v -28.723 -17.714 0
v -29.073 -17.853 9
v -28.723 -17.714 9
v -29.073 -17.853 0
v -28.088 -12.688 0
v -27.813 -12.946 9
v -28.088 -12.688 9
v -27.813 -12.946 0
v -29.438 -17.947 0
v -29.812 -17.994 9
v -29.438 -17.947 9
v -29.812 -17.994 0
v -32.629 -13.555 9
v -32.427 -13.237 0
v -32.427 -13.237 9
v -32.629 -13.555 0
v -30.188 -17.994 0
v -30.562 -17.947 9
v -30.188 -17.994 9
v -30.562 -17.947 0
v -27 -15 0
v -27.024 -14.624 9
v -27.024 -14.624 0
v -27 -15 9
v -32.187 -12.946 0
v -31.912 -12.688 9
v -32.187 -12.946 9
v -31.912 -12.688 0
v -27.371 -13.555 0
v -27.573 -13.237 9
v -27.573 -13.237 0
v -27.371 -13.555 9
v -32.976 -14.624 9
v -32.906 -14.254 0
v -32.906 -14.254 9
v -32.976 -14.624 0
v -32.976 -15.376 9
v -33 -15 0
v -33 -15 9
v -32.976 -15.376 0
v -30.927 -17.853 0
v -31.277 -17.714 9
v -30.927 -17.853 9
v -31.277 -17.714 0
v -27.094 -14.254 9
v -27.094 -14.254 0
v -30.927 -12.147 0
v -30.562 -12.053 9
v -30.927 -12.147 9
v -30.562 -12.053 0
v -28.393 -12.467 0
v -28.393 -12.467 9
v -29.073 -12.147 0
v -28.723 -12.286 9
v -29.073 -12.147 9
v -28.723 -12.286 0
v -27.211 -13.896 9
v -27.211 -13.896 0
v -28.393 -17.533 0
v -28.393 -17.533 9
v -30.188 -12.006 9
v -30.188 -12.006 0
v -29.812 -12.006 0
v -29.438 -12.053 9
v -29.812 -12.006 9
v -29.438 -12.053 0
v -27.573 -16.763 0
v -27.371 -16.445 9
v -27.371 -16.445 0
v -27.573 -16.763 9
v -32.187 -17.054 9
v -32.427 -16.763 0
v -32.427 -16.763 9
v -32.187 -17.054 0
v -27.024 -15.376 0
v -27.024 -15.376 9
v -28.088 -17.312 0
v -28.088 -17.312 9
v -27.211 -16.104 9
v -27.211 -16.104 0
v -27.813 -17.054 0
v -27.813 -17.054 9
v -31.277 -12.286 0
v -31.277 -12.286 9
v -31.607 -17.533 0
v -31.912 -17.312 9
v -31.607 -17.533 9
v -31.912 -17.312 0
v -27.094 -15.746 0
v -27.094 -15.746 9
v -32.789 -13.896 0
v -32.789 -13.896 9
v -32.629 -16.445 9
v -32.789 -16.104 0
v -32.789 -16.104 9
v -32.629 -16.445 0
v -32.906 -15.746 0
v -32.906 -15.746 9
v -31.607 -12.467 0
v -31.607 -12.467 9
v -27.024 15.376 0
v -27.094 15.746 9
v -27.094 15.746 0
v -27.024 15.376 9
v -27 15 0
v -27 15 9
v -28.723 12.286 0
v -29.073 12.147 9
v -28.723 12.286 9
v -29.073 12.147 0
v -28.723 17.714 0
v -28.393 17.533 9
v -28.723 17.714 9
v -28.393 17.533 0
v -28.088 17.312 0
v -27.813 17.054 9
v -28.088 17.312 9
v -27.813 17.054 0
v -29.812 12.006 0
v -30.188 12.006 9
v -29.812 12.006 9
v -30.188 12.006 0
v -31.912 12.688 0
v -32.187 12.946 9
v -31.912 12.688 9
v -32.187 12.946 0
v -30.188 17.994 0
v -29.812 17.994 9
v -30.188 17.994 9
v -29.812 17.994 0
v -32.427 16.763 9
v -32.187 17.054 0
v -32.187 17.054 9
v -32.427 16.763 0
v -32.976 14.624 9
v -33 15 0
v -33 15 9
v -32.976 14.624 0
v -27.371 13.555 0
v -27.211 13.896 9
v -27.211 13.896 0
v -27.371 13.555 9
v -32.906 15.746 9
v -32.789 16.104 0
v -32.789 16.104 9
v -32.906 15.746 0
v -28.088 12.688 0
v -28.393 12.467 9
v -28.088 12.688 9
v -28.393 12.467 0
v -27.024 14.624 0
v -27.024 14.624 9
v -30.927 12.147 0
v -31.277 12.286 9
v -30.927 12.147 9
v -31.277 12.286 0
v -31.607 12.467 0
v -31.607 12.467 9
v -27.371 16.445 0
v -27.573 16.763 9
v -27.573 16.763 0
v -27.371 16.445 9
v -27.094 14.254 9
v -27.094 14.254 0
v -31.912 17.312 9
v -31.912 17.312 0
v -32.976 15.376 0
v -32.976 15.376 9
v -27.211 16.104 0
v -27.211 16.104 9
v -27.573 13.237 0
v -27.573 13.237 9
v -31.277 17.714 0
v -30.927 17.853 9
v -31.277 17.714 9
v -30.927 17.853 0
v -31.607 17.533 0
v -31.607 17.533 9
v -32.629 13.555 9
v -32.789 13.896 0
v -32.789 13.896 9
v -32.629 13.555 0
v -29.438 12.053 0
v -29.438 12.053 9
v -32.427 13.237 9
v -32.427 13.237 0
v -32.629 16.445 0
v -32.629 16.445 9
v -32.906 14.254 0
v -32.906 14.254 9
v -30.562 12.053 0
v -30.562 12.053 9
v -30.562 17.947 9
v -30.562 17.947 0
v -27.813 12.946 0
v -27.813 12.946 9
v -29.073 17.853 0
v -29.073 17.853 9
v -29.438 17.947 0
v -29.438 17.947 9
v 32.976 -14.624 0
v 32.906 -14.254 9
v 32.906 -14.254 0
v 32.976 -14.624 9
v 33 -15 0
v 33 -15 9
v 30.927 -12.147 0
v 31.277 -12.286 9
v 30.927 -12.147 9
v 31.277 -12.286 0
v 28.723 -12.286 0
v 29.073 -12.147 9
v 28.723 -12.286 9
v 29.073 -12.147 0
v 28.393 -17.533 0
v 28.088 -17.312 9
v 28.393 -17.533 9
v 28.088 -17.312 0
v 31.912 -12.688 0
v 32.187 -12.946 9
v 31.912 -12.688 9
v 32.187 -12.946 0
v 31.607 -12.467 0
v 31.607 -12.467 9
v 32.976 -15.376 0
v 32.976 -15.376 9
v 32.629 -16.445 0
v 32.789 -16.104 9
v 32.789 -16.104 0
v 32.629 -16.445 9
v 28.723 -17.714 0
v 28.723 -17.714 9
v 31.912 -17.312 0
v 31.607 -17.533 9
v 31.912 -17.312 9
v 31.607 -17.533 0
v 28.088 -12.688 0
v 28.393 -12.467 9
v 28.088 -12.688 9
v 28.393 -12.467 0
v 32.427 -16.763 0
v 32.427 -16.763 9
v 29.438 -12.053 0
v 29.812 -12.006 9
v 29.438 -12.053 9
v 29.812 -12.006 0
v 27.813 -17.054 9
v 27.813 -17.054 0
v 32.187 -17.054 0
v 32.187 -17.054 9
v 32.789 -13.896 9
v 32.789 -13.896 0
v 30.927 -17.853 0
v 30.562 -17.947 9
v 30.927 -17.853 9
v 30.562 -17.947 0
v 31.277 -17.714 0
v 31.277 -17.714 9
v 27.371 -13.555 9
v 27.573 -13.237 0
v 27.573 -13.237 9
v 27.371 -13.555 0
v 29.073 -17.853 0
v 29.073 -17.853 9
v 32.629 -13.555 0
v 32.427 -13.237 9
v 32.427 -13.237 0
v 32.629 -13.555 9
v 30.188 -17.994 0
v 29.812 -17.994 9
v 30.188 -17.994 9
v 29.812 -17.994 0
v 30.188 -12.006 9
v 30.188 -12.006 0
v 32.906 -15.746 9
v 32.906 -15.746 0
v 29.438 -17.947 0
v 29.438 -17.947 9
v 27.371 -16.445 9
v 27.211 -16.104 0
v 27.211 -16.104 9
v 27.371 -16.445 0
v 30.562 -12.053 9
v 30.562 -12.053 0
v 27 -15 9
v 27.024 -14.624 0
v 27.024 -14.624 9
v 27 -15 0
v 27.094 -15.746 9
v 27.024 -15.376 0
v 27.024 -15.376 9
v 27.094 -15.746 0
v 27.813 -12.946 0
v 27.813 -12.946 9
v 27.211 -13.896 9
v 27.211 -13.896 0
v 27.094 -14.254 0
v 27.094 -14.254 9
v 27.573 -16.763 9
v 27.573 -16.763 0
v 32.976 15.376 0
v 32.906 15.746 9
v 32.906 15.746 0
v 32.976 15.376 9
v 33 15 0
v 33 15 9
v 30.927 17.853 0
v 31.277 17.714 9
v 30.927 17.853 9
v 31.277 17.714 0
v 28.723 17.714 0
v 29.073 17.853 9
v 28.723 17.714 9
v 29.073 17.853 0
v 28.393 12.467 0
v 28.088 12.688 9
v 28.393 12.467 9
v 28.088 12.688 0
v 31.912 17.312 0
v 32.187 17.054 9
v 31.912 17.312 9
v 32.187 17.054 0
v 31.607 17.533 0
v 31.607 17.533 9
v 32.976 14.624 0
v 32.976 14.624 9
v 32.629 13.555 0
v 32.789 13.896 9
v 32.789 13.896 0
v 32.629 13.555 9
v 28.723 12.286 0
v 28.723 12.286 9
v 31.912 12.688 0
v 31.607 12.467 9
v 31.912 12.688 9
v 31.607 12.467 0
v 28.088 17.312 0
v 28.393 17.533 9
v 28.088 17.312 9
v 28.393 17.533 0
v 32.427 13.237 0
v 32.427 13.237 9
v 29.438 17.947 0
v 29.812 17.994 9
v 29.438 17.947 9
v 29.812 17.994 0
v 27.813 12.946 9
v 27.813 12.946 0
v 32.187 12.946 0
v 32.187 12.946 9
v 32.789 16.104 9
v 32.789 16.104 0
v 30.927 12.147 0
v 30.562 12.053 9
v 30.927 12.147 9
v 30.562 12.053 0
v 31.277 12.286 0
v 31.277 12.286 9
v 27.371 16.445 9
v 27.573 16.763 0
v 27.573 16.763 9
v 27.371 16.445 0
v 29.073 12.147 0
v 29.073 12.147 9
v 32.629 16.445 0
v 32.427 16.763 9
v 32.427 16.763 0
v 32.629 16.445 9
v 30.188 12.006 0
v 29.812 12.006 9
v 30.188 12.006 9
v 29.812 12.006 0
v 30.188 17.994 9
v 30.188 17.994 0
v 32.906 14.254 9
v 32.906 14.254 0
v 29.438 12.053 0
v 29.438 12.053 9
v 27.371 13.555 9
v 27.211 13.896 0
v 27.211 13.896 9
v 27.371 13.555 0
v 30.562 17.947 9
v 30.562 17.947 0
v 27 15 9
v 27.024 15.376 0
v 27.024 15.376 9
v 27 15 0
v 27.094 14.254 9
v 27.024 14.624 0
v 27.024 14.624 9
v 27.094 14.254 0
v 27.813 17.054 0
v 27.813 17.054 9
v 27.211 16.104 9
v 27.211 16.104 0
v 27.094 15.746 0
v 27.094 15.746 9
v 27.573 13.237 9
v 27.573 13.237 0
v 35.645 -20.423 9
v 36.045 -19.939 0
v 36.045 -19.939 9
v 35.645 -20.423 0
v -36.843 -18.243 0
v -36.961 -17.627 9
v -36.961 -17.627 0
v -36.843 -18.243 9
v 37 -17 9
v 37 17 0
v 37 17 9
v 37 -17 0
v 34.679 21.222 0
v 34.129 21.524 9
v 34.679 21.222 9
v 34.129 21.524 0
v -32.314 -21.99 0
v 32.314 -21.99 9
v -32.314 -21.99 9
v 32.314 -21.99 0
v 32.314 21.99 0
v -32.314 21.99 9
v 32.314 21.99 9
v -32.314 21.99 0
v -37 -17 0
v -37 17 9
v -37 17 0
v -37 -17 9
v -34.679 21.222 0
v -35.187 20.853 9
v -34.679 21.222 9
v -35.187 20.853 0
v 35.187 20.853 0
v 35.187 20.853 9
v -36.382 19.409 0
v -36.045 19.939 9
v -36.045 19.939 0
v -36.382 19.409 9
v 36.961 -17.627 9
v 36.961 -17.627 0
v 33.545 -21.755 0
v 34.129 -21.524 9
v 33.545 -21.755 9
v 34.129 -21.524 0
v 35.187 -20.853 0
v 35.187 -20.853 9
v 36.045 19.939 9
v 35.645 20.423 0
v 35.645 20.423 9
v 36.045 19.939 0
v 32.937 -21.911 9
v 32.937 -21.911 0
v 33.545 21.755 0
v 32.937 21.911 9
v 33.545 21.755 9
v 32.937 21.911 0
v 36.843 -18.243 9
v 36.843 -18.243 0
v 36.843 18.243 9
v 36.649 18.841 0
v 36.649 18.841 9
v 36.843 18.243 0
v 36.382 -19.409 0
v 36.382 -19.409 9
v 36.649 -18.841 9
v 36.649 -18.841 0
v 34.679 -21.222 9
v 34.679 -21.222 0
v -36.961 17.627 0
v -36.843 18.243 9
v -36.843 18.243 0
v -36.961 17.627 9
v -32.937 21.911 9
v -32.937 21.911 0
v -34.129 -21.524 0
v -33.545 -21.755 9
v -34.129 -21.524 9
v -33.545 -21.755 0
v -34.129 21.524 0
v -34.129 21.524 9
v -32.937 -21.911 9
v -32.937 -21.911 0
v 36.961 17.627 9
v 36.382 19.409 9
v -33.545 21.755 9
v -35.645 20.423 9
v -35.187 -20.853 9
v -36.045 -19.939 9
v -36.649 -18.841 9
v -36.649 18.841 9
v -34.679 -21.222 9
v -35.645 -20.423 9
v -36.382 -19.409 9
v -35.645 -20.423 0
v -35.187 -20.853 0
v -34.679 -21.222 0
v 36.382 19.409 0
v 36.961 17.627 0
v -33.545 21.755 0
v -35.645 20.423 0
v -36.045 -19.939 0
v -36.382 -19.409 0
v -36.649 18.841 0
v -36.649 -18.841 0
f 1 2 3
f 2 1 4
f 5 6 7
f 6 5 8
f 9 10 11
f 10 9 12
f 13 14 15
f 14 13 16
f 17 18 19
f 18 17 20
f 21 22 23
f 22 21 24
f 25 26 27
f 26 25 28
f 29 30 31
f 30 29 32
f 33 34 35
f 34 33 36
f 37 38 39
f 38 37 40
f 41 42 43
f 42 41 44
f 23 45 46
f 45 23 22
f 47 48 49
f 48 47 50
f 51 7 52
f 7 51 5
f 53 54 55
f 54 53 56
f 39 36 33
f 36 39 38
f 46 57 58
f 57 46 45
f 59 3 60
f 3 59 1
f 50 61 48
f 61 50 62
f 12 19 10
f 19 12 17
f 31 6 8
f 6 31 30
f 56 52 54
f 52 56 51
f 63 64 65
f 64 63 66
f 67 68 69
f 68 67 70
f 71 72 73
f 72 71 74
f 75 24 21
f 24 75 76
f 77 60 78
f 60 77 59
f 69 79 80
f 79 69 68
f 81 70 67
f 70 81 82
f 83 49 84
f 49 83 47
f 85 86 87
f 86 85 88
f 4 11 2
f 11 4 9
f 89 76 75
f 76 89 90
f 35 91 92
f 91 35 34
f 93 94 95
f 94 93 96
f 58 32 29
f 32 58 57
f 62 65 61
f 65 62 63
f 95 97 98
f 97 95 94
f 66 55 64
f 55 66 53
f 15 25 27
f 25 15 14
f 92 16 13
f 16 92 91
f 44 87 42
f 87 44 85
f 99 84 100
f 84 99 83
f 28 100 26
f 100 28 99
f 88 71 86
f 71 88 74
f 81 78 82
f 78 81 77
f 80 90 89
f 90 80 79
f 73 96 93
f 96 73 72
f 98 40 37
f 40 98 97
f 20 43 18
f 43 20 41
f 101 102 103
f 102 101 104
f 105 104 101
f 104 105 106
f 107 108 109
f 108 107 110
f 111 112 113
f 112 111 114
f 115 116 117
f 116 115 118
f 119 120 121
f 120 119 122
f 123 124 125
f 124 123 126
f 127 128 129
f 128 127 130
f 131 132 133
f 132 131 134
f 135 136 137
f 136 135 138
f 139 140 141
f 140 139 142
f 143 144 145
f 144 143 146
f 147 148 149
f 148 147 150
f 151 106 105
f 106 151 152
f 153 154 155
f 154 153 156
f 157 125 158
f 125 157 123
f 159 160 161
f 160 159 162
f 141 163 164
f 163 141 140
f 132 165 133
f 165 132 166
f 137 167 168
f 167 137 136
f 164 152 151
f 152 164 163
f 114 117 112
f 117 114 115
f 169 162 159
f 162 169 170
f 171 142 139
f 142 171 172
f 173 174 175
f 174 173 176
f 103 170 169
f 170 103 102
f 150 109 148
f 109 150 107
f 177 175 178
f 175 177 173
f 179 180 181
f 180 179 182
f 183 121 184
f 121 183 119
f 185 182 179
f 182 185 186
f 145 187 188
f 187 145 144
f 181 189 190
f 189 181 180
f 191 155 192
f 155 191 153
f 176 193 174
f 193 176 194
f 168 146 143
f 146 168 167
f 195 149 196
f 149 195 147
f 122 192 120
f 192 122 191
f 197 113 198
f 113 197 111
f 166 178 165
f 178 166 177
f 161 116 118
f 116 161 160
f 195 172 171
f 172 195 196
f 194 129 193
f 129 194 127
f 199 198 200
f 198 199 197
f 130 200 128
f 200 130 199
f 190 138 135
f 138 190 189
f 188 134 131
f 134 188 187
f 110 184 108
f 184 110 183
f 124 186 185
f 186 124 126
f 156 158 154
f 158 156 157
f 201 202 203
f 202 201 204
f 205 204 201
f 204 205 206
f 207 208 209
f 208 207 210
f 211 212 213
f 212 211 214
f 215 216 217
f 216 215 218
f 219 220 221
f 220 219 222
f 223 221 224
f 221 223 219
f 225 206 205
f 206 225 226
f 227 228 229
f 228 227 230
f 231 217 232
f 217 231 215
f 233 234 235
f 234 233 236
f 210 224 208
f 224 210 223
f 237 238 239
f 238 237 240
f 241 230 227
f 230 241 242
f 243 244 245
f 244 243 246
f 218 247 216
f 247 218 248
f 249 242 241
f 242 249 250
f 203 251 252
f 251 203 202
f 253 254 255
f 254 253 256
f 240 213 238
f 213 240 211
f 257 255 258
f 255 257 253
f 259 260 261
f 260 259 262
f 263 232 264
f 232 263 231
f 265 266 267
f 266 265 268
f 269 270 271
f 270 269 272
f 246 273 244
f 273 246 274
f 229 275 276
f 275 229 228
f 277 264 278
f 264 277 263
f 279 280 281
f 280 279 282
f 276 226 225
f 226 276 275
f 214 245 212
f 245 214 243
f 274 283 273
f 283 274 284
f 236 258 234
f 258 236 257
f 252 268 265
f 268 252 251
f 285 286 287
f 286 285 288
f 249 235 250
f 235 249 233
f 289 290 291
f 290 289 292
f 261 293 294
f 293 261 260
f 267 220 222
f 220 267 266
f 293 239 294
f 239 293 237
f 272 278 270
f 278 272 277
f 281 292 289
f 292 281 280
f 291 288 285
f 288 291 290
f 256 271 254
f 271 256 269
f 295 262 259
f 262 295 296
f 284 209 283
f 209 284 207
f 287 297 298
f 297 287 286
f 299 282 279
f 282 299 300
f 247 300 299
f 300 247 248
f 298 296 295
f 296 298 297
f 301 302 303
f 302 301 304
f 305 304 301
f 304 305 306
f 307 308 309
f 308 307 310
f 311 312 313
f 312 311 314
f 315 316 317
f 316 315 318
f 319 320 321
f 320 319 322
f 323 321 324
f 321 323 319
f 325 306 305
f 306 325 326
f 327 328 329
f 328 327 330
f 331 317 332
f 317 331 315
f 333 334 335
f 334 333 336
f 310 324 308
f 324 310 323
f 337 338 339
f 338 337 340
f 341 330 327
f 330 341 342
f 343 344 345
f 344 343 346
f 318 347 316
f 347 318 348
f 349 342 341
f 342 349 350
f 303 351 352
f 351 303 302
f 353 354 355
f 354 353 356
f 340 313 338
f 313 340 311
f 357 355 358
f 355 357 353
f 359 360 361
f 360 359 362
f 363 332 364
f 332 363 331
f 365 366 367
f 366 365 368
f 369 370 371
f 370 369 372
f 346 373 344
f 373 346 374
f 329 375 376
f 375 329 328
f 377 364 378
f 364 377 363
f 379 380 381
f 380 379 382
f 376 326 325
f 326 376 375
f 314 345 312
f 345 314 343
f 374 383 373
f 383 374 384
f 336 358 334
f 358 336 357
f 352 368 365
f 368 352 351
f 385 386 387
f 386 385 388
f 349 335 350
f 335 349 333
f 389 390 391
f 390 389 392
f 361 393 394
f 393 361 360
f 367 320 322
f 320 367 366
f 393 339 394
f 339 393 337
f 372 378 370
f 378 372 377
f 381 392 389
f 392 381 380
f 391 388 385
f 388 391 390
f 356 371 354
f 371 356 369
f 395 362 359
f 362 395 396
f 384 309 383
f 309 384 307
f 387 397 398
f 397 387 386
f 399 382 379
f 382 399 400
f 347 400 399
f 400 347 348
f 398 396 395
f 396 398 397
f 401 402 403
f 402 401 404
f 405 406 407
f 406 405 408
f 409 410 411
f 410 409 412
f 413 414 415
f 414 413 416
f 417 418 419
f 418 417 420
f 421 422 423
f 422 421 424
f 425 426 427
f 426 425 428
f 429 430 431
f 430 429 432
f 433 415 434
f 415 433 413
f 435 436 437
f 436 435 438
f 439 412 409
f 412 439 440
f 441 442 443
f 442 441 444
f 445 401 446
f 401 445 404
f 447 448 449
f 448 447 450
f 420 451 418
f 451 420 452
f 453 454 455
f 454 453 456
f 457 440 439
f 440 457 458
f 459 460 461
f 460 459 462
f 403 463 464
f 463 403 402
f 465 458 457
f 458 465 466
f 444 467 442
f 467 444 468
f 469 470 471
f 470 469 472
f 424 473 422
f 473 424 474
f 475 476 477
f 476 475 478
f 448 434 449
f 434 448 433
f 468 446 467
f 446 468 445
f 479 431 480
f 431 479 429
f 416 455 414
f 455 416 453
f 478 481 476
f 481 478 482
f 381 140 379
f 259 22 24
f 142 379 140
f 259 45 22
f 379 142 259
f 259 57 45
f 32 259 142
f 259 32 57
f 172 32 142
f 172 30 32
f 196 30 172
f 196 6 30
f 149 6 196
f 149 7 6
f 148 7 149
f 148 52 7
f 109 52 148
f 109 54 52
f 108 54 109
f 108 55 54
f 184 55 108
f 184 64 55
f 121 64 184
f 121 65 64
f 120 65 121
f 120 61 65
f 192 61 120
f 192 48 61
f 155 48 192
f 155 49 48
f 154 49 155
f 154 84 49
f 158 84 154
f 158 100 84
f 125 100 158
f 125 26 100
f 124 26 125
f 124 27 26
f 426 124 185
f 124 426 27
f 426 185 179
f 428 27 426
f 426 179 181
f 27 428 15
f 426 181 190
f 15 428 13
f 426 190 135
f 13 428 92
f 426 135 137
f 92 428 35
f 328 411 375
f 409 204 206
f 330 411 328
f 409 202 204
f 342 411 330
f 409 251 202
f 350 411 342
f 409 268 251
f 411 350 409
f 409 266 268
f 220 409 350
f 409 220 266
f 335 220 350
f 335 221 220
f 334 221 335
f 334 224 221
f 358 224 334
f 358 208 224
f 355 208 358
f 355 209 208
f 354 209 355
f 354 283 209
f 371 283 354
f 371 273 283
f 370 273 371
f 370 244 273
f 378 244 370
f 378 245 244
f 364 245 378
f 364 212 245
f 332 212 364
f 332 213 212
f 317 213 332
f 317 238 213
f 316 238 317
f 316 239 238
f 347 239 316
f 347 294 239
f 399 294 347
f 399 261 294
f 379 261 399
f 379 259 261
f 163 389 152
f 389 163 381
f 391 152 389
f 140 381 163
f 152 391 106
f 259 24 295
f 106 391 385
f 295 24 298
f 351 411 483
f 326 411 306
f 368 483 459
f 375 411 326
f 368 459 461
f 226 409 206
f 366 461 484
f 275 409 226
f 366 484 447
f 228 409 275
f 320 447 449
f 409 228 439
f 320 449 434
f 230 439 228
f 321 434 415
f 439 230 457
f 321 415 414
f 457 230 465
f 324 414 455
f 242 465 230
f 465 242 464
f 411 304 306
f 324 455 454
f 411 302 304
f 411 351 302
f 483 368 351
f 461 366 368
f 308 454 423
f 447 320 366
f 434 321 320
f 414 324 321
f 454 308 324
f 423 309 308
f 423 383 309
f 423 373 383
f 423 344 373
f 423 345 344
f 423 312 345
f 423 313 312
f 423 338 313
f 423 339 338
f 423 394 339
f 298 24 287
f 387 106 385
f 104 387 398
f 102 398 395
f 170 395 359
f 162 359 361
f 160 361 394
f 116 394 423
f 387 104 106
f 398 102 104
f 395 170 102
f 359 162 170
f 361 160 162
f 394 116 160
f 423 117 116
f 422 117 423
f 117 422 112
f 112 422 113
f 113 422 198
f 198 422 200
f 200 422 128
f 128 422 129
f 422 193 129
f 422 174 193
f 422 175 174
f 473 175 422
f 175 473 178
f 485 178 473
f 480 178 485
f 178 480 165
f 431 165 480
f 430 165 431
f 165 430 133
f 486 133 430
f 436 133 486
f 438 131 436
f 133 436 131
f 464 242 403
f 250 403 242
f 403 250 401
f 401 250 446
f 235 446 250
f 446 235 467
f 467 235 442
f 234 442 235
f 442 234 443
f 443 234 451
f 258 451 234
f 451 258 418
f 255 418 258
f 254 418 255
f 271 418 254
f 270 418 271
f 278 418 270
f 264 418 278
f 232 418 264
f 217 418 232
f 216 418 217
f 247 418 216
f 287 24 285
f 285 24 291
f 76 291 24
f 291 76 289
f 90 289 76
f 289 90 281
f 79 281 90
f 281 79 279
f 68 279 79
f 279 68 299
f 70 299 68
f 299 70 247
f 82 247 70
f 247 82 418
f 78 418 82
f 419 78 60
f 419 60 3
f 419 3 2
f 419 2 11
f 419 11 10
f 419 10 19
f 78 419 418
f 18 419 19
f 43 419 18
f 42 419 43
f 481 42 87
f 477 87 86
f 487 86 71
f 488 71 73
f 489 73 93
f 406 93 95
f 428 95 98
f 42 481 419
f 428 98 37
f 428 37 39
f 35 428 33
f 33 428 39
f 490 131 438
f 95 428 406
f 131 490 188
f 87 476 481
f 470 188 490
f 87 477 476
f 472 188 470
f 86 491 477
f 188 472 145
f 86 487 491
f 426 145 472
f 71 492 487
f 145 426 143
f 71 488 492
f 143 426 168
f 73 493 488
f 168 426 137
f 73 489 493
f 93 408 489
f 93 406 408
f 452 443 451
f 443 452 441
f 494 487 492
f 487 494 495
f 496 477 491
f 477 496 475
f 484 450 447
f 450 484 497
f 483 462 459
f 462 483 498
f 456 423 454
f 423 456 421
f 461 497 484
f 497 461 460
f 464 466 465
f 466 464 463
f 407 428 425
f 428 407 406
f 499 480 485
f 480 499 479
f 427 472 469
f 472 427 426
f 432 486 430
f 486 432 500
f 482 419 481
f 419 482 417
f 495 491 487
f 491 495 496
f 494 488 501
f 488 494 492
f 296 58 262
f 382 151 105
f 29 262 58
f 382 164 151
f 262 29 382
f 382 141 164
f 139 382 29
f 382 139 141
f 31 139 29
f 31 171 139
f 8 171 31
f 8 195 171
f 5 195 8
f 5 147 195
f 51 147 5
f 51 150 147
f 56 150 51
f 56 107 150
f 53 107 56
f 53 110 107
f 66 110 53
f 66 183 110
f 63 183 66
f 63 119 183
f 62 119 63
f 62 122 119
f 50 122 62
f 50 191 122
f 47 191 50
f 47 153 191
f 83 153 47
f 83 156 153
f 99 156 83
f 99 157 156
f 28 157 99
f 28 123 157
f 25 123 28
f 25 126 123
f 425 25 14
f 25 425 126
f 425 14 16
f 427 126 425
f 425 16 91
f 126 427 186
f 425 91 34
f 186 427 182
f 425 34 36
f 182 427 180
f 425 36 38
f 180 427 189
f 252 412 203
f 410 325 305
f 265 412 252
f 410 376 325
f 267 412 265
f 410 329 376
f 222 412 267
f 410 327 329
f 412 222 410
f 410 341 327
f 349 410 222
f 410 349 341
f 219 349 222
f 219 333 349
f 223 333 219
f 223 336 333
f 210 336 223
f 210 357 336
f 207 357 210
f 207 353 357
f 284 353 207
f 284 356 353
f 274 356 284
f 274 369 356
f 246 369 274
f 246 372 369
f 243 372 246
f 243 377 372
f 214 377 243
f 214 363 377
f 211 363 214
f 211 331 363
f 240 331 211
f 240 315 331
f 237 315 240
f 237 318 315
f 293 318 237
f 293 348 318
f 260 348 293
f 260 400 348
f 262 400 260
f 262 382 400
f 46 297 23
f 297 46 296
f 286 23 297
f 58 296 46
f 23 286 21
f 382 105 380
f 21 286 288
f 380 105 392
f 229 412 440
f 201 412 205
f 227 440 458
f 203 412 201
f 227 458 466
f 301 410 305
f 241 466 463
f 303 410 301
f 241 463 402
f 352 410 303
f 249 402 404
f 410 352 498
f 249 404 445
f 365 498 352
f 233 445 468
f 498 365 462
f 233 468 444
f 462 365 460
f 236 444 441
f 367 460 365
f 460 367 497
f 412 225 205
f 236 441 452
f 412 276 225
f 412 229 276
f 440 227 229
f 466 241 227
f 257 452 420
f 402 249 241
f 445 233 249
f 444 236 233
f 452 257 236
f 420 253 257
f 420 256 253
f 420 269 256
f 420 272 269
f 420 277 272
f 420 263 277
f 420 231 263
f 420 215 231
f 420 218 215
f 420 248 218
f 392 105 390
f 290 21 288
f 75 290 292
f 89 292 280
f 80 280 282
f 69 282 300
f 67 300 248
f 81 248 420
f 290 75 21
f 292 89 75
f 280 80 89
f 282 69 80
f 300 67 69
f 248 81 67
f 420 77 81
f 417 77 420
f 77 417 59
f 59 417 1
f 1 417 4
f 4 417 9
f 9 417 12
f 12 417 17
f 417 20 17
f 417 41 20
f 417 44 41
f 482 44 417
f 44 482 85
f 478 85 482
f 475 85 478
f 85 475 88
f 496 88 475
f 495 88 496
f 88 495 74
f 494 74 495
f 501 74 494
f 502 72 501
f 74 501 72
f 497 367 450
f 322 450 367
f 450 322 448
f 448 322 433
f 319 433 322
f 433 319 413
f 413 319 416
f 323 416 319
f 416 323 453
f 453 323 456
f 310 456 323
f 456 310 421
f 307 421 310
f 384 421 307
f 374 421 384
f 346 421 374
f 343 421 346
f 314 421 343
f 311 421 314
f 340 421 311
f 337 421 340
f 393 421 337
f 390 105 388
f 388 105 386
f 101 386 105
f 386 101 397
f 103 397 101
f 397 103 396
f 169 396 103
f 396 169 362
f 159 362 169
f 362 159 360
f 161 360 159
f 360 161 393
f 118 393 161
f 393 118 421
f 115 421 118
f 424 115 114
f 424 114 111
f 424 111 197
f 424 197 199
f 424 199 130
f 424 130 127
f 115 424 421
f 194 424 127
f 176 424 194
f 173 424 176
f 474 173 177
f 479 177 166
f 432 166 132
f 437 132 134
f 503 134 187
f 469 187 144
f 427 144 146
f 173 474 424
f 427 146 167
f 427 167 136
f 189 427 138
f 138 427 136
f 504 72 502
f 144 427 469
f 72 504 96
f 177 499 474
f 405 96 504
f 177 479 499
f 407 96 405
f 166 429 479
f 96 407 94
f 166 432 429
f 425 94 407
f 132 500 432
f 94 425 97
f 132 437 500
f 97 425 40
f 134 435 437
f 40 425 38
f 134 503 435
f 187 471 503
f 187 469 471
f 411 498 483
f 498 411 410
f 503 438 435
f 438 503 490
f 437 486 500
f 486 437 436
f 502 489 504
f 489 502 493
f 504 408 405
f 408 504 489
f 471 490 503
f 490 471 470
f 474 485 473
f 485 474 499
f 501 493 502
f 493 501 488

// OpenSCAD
$fn = 50;


difference() {
	union() {
		hull() {
			translate(v = [-32.0000000000, 17.0000000000, 0]) {
				cylinder(h = 9, r = 5);
			}
			translate(v = [32.0000000000, 17.0000000000, 0]) {
				cylinder(h = 9, r = 5);
			}
			translate(v = [-32.0000000000, -17.0000000000, 0]) {
				cylinder(h = 9, r = 5);
			}
			translate(v = [32.0000000000, -17.0000000000, 0]) {
				cylinder(h = 9, r = 5);
			}
		}
	}
	union() {
		translate(v = [-30.0000000000, -15.0000000000, -100.0000000000]) {
			cylinder(h = 200, r = 3.0000000000);
		}
		translate(v = [-30.0000000000, 15.0000000000, -100.0000000000]) {
			cylinder(h = 200, r = 3.0000000000);
		}
		translate(v = [30.0000000000, -15.0000000000, -100.0000000000]) {
			cylinder(h = 200, r = 3.0000000000);
		}
		translate(v = [30.0000000000, 15.0000000000, -100.0000000000]) {
			cylinder(h = 200, r = 3.0000000000);
		}
	}
}
